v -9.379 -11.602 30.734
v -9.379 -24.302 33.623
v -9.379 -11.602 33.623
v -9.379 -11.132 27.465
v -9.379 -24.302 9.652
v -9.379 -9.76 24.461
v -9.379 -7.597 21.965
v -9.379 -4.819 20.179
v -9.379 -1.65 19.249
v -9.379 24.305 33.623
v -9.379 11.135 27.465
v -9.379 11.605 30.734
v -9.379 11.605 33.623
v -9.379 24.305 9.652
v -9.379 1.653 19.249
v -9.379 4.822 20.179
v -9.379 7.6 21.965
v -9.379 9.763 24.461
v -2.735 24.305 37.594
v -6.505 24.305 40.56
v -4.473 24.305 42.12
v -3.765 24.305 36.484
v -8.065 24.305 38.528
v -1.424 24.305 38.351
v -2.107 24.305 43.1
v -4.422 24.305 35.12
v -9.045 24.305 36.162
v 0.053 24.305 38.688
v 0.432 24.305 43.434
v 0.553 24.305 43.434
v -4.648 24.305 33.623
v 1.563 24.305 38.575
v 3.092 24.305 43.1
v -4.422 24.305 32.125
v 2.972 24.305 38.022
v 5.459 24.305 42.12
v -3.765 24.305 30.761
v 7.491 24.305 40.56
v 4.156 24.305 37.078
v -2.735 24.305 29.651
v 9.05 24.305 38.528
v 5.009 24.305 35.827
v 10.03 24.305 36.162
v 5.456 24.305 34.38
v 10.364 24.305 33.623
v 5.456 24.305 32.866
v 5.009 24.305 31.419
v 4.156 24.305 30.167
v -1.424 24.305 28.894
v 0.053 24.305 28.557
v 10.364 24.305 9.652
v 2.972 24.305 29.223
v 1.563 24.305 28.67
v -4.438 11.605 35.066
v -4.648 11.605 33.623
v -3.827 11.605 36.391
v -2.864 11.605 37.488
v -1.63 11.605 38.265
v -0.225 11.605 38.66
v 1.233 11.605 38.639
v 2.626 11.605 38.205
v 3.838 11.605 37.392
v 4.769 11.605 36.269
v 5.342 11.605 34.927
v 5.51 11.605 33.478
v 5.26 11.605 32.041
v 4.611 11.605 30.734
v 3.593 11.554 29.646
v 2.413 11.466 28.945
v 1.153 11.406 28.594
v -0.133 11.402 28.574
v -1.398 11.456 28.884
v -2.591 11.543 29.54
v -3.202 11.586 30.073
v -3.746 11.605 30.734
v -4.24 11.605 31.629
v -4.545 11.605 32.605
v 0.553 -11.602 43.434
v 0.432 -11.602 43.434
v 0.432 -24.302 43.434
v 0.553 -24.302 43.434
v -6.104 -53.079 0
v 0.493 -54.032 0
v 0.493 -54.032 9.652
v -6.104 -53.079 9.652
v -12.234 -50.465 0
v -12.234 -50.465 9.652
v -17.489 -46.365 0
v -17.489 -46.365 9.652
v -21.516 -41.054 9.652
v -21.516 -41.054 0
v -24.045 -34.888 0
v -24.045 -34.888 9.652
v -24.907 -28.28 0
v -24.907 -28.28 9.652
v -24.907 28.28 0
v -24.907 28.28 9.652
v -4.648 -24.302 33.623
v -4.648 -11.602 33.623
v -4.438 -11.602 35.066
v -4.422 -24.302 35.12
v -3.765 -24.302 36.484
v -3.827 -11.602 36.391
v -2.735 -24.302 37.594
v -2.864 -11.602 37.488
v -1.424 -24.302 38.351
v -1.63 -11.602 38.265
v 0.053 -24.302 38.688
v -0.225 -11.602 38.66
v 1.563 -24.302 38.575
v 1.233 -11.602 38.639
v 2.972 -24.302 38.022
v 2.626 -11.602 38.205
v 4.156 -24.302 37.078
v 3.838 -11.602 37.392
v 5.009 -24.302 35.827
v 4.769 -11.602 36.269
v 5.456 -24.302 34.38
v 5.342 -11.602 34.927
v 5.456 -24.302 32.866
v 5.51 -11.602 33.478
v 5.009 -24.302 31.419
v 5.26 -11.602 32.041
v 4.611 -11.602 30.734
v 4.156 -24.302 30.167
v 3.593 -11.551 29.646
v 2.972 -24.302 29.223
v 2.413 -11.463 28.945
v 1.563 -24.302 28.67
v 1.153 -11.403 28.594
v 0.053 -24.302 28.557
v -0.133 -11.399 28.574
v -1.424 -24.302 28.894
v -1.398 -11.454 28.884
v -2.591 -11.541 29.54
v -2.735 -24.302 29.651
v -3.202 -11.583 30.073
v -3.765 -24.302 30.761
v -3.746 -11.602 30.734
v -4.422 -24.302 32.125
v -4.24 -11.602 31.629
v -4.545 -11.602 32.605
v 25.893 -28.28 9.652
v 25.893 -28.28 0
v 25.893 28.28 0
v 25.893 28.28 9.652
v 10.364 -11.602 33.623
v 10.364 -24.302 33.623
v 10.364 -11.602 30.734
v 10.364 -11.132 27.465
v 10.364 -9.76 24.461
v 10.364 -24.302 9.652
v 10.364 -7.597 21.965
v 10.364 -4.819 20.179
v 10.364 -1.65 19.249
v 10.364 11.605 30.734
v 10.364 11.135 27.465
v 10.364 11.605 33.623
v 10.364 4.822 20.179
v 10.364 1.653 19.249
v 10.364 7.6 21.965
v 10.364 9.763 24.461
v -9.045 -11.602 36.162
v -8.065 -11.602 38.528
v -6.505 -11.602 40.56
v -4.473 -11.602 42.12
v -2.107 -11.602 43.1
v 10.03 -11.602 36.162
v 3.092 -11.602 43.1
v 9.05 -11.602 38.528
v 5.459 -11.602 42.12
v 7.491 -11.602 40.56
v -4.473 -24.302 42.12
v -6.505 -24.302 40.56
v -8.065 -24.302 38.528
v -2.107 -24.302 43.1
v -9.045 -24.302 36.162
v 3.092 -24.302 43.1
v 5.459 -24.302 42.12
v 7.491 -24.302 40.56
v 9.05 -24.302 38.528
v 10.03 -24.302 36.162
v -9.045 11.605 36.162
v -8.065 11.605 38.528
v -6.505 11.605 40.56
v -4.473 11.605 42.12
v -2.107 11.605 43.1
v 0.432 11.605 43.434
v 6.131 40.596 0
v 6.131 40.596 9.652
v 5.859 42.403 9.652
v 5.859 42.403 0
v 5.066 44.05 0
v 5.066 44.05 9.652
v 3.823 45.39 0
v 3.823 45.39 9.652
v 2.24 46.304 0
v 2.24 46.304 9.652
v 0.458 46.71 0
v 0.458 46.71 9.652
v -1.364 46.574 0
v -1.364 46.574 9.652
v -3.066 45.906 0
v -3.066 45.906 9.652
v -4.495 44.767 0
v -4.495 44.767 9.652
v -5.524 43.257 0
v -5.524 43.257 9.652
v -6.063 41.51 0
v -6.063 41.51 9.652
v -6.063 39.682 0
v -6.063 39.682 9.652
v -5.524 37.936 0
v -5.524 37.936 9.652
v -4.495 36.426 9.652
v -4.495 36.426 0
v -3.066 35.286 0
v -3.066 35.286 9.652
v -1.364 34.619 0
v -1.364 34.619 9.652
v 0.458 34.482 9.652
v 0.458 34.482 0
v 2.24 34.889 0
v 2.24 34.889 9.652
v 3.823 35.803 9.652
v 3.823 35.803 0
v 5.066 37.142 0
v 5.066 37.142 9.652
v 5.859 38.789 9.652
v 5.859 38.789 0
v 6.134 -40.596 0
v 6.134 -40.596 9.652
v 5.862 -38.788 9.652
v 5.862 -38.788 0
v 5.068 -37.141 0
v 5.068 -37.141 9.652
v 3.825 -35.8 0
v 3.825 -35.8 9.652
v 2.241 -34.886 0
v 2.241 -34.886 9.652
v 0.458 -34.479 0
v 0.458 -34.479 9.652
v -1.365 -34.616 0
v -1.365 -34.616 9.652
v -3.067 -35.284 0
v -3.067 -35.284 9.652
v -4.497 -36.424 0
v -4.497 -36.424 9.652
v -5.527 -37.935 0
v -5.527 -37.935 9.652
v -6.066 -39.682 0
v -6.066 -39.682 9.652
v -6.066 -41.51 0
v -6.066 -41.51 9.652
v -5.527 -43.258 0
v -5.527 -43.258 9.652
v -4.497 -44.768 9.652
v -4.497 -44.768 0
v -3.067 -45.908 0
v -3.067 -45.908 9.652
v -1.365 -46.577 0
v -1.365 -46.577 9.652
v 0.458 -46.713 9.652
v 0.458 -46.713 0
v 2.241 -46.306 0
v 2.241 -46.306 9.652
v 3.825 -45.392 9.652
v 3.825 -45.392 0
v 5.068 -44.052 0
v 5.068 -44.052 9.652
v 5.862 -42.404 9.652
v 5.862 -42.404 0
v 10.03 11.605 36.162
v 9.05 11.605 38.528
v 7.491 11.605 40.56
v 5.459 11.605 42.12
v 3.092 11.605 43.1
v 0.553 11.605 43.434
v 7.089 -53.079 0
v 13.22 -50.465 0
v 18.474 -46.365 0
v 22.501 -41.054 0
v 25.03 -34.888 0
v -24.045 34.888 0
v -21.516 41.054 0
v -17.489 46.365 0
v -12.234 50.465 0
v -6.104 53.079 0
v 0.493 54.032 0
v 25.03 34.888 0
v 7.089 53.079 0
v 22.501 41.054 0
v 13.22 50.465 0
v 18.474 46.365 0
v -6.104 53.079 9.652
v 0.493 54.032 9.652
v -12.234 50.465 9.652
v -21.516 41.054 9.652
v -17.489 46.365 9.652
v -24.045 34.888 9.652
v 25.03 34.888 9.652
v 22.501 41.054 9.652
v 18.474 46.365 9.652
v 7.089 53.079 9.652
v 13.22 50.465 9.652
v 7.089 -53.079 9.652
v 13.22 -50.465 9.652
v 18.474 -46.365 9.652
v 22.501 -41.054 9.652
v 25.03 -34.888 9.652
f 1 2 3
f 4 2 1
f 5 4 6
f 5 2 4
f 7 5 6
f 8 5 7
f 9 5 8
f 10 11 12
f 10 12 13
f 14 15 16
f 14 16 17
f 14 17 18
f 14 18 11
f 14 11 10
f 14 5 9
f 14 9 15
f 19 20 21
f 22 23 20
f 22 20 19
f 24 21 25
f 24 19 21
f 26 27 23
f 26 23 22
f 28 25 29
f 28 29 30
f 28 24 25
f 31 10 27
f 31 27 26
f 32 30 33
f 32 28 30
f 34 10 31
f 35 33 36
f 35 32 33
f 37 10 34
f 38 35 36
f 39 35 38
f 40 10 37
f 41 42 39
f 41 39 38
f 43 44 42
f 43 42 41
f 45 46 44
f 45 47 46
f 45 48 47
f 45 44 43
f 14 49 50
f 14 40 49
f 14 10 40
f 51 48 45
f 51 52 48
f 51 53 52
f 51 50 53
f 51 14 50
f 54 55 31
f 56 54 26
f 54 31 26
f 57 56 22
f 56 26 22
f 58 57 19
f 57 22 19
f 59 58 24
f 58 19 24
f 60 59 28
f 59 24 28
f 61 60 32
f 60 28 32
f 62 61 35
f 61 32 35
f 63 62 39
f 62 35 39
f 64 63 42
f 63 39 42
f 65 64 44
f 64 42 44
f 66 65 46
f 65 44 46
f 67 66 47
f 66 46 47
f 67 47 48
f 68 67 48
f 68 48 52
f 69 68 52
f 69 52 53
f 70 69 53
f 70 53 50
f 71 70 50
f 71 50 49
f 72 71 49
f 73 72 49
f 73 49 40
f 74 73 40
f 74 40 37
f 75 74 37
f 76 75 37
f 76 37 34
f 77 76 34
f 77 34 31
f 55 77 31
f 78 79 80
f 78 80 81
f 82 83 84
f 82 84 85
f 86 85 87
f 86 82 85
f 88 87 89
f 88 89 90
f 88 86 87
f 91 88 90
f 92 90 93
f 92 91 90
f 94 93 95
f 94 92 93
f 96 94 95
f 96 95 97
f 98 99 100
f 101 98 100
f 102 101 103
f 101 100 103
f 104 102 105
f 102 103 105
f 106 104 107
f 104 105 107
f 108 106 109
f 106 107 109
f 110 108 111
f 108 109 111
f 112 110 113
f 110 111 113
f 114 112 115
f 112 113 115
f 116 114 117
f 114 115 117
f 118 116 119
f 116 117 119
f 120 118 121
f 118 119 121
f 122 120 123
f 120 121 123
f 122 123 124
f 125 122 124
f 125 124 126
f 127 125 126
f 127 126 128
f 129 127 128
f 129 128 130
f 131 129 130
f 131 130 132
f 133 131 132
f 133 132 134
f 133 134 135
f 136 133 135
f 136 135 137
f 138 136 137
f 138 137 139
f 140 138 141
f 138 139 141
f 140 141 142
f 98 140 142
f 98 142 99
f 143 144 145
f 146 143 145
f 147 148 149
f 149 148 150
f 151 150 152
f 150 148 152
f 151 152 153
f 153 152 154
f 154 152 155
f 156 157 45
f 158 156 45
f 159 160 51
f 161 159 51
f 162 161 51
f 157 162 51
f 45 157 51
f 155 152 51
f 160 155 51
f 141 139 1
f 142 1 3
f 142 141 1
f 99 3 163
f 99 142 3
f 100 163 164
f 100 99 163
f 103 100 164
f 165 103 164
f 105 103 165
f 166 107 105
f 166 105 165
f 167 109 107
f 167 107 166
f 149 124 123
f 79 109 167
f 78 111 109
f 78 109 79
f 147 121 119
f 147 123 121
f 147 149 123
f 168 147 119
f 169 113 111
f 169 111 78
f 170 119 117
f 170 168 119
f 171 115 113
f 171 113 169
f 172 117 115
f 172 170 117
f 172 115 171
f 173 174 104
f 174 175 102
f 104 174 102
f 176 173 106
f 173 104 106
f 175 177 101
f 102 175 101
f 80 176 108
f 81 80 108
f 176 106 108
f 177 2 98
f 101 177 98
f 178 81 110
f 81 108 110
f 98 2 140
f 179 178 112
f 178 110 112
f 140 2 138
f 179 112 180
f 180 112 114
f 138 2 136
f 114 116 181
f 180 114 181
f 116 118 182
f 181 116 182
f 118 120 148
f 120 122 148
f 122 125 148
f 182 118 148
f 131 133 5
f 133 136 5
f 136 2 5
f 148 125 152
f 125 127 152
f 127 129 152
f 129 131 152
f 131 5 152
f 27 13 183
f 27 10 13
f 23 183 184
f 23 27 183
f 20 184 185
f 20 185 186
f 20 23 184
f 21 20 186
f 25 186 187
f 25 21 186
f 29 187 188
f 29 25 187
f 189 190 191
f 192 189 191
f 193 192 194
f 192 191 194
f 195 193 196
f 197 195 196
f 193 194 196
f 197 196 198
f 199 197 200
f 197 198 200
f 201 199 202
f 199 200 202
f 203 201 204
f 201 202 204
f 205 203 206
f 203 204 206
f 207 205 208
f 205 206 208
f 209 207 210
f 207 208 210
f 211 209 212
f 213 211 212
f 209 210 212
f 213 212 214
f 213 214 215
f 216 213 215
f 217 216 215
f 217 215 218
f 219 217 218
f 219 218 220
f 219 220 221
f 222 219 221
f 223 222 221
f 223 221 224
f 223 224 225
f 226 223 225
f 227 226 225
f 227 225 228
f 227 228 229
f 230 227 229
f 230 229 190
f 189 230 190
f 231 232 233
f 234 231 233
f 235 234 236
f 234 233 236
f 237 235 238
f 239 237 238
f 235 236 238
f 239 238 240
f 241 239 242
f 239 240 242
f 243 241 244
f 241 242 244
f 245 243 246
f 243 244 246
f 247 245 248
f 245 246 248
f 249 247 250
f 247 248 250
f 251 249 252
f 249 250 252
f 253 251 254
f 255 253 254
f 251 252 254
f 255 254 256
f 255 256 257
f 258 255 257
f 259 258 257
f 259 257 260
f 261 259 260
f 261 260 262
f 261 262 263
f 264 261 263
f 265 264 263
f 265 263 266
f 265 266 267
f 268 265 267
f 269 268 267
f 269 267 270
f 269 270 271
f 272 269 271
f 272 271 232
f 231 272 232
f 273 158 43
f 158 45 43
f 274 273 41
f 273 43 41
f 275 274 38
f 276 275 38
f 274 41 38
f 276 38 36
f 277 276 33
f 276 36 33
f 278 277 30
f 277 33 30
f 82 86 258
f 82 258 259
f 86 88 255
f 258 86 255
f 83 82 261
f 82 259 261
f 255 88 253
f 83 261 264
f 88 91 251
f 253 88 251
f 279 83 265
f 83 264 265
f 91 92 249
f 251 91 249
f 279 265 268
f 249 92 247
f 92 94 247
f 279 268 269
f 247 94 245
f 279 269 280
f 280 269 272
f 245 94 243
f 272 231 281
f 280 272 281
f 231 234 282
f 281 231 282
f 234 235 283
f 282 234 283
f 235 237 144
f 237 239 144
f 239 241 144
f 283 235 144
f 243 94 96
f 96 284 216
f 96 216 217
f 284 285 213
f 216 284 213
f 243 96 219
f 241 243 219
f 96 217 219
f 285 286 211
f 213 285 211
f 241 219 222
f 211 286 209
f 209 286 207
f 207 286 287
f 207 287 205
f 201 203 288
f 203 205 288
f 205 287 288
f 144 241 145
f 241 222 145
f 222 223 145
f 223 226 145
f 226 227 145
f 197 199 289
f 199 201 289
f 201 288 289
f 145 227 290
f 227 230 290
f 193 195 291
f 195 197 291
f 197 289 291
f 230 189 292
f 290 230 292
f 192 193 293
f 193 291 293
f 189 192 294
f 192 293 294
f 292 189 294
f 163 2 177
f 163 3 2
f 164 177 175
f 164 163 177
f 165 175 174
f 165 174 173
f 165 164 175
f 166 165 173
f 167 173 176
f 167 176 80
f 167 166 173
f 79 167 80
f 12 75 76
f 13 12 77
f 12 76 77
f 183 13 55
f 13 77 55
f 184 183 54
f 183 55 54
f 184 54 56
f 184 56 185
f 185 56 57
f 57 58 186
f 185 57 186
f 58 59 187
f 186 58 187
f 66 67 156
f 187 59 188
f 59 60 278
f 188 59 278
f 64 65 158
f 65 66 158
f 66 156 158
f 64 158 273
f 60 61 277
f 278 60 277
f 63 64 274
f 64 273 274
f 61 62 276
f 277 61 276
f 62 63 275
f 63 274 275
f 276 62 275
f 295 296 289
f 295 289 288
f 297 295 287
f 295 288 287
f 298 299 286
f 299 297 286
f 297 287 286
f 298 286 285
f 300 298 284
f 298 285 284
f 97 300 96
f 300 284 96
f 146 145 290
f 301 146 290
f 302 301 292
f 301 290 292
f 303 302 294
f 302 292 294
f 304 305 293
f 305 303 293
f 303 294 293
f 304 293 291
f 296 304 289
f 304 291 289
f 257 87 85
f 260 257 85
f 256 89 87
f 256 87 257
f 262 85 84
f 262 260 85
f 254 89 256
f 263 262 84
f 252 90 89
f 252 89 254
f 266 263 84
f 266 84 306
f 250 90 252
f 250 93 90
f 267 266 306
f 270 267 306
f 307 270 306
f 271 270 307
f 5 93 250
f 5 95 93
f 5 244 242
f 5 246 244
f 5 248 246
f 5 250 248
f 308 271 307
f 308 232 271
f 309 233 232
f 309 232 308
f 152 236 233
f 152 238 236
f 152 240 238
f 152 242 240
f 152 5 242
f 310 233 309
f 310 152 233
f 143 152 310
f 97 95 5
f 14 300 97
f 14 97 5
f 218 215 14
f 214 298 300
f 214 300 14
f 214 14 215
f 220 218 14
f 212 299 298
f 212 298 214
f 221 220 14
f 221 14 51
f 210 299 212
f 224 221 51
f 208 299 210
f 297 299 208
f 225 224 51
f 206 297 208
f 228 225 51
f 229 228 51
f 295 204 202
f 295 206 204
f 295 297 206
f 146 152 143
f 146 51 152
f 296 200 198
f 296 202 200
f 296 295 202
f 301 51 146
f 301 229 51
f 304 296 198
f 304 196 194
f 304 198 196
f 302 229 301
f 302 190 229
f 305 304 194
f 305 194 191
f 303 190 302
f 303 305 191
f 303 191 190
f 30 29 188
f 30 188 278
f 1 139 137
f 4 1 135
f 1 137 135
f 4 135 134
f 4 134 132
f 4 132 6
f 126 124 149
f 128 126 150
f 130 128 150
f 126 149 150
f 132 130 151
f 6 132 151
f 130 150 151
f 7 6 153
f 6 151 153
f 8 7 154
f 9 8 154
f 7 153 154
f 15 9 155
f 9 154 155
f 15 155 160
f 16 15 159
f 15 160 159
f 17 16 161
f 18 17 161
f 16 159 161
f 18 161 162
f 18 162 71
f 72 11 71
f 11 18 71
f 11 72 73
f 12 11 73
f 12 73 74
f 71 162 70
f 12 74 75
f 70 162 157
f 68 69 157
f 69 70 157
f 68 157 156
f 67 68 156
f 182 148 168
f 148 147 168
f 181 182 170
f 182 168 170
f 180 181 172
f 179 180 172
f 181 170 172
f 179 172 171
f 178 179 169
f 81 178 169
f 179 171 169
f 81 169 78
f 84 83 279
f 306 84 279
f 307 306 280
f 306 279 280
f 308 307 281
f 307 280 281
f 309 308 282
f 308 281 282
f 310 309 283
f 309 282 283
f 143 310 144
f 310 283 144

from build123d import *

# Parameters (mm, degrees)
F0_W        = 50.8
F0_H        = 108.0689131842
F1_DEPTH    = 9.652
F2_T1_DEPTH = 138.426151417
F3_R        = 6.1341
F3_R_2      = 6.1313496656
F4_DEPTH    = 9.653
F5_W        = 19.7433687763
F5_H        = 48.6069692673
F6_DEPTH    = 33.782
F7_W        = 23.2069692673
F7_H        = 12.7
F8_DEPTH    = 35.2726834568
F9_R        = 9.8113639175
F10_R       = 5.08
F11_DEPTH   = 78.3378719873


# Not quite as in the source:
# - a fillet or chamfer that OpenCascade refuses, or shapes differently, is made with other operations: its cross-section is extruded or revolved along the edge and cut away or added


with BuildPart() as f1:
    # F0 (on Top) → F1 (new body)
    with BuildSketch(Plane.XY):
        with Locations((0.4926733673, 0)):
            Rectangle(F0_W, F0_H)
    extrude(amount=F1_DEPTH)

    # F2: fillet of radius 25.7548302834 on 4 edges, made by hand

    # F2_s2 → F2_t1 (cut)
    with BuildSketch(Plane.XY.offset(-64.3870757085)):
        with BuildLine():
            ThreePointArc((25.8926733673, 28.2796263087), (18.3492582256, 46.4910414504), (0.1378430839, 54.0344565921))
            Line((0.1378430839, 54.0344565921), (25.8926733673, 54.0344565921))
            Line((25.8926733673, 54.0344565921), (25.8926733673, 28.2796263087))
        make_face()
        with BuildLine():
            ThreePointArc((0.8475036507, 54.0344565921), (-17.363911491, 46.4910414504), (-24.9073266327, 28.2796263087))
            Line((-24.9073266327, 28.2796263087), (-24.9073266327, 54.0344565921))
            Line((-24.9073266327, 54.0344565921), (0.8475036507, 54.0344565921))
        make_face()
        with BuildLine():
            ThreePointArc((0.1378430839, -54.0344565921), (18.3492582256, -46.4910414504), (25.8926733673, -28.2796263087))
            Line((25.8926733673, -28.2796263087), (25.8926733673, -54.0344565921))
            Line((25.8926733673, -54.0344565921), (0.1378430839, -54.0344565921))
        make_face()
        with BuildLine():
            ThreePointArc((0.8475036507, -54.0344565921), (-17.363911491, -46.4910414504), (-24.9073266327, -28.2796263087))
            Line((-24.9073266327, -28.2796263087), (-24.9073266327, -54.0344565921))
            Line((-24.9073266327, -54.0344565921), (0.8475036507, -54.0344565921))
        make_face()
    extrude(amount=F2_T1_DEPTH, mode=Mode.SUBTRACT)

    # F3 (on face) → F4 (cut, through all)
    with BuildSketch(Plane.XY.offset(9.652)):
        with Locations((0, -40.5962094665)):
            Circle(F3_R)
        with Locations((0, 40.5962094665)):
            Circle(F3_R_2)
    extrude(amount=-F4_DEPTH, mode=Mode.SUBTRACT)

    # F5 (on face) → F6 (join)
    with BuildSketch(Plane.XY.offset(9.652)):
        with Locations((0.4926724359, 0.0013751672)):
            Rectangle(F5_W, F5_H)
    extrude(amount=F6_DEPTH)

    # F7 (on face) → F8 (cut, through all)
    with BuildSketch(Plane.YZ.offset(10.3643568241)):
        with Locations((0.0013751672, 37.084)):
            Rectangle(F7_W, F7_H)
        with BuildLine():
            Line((11.6048598008, 30.734), (-11.6021094665, 30.734))
            ThreePointArc((-11.6021094665, 30.734), (0.0013751672, 19.1305153664), (11.6048598008, 30.734))
        make_face()
    extrude(amount=-F8_DEPTH, mode=Mode.SUBTRACT)

    # F9
    f9_edges = [f1.edges().sort_by_distance(p)[0] for p in [
        (-9.379012, 17.95486, 43.434),
        (10.364357, 17.95486, 43.434),
        (-9.379012, -17.952109, 43.434),
        (10.364357, -17.952109, 43.434),
    ]]
    fillet(f9_edges, radius=F9_R)

    # F10 (on face) → F11 (cut, through all)
    with BuildSketch(Plane(origin=(0, 24.3048598008, 0), x_dir=(-1, 0, 0), z_dir=(0, 1, 0))):
        with Locations((-0.4323519653, 33.6226360825)):
            Circle(F10_R)
    extrude(amount=-F11_DEPTH, mode=Mode.SUBTRACT)


solid = f1.part
